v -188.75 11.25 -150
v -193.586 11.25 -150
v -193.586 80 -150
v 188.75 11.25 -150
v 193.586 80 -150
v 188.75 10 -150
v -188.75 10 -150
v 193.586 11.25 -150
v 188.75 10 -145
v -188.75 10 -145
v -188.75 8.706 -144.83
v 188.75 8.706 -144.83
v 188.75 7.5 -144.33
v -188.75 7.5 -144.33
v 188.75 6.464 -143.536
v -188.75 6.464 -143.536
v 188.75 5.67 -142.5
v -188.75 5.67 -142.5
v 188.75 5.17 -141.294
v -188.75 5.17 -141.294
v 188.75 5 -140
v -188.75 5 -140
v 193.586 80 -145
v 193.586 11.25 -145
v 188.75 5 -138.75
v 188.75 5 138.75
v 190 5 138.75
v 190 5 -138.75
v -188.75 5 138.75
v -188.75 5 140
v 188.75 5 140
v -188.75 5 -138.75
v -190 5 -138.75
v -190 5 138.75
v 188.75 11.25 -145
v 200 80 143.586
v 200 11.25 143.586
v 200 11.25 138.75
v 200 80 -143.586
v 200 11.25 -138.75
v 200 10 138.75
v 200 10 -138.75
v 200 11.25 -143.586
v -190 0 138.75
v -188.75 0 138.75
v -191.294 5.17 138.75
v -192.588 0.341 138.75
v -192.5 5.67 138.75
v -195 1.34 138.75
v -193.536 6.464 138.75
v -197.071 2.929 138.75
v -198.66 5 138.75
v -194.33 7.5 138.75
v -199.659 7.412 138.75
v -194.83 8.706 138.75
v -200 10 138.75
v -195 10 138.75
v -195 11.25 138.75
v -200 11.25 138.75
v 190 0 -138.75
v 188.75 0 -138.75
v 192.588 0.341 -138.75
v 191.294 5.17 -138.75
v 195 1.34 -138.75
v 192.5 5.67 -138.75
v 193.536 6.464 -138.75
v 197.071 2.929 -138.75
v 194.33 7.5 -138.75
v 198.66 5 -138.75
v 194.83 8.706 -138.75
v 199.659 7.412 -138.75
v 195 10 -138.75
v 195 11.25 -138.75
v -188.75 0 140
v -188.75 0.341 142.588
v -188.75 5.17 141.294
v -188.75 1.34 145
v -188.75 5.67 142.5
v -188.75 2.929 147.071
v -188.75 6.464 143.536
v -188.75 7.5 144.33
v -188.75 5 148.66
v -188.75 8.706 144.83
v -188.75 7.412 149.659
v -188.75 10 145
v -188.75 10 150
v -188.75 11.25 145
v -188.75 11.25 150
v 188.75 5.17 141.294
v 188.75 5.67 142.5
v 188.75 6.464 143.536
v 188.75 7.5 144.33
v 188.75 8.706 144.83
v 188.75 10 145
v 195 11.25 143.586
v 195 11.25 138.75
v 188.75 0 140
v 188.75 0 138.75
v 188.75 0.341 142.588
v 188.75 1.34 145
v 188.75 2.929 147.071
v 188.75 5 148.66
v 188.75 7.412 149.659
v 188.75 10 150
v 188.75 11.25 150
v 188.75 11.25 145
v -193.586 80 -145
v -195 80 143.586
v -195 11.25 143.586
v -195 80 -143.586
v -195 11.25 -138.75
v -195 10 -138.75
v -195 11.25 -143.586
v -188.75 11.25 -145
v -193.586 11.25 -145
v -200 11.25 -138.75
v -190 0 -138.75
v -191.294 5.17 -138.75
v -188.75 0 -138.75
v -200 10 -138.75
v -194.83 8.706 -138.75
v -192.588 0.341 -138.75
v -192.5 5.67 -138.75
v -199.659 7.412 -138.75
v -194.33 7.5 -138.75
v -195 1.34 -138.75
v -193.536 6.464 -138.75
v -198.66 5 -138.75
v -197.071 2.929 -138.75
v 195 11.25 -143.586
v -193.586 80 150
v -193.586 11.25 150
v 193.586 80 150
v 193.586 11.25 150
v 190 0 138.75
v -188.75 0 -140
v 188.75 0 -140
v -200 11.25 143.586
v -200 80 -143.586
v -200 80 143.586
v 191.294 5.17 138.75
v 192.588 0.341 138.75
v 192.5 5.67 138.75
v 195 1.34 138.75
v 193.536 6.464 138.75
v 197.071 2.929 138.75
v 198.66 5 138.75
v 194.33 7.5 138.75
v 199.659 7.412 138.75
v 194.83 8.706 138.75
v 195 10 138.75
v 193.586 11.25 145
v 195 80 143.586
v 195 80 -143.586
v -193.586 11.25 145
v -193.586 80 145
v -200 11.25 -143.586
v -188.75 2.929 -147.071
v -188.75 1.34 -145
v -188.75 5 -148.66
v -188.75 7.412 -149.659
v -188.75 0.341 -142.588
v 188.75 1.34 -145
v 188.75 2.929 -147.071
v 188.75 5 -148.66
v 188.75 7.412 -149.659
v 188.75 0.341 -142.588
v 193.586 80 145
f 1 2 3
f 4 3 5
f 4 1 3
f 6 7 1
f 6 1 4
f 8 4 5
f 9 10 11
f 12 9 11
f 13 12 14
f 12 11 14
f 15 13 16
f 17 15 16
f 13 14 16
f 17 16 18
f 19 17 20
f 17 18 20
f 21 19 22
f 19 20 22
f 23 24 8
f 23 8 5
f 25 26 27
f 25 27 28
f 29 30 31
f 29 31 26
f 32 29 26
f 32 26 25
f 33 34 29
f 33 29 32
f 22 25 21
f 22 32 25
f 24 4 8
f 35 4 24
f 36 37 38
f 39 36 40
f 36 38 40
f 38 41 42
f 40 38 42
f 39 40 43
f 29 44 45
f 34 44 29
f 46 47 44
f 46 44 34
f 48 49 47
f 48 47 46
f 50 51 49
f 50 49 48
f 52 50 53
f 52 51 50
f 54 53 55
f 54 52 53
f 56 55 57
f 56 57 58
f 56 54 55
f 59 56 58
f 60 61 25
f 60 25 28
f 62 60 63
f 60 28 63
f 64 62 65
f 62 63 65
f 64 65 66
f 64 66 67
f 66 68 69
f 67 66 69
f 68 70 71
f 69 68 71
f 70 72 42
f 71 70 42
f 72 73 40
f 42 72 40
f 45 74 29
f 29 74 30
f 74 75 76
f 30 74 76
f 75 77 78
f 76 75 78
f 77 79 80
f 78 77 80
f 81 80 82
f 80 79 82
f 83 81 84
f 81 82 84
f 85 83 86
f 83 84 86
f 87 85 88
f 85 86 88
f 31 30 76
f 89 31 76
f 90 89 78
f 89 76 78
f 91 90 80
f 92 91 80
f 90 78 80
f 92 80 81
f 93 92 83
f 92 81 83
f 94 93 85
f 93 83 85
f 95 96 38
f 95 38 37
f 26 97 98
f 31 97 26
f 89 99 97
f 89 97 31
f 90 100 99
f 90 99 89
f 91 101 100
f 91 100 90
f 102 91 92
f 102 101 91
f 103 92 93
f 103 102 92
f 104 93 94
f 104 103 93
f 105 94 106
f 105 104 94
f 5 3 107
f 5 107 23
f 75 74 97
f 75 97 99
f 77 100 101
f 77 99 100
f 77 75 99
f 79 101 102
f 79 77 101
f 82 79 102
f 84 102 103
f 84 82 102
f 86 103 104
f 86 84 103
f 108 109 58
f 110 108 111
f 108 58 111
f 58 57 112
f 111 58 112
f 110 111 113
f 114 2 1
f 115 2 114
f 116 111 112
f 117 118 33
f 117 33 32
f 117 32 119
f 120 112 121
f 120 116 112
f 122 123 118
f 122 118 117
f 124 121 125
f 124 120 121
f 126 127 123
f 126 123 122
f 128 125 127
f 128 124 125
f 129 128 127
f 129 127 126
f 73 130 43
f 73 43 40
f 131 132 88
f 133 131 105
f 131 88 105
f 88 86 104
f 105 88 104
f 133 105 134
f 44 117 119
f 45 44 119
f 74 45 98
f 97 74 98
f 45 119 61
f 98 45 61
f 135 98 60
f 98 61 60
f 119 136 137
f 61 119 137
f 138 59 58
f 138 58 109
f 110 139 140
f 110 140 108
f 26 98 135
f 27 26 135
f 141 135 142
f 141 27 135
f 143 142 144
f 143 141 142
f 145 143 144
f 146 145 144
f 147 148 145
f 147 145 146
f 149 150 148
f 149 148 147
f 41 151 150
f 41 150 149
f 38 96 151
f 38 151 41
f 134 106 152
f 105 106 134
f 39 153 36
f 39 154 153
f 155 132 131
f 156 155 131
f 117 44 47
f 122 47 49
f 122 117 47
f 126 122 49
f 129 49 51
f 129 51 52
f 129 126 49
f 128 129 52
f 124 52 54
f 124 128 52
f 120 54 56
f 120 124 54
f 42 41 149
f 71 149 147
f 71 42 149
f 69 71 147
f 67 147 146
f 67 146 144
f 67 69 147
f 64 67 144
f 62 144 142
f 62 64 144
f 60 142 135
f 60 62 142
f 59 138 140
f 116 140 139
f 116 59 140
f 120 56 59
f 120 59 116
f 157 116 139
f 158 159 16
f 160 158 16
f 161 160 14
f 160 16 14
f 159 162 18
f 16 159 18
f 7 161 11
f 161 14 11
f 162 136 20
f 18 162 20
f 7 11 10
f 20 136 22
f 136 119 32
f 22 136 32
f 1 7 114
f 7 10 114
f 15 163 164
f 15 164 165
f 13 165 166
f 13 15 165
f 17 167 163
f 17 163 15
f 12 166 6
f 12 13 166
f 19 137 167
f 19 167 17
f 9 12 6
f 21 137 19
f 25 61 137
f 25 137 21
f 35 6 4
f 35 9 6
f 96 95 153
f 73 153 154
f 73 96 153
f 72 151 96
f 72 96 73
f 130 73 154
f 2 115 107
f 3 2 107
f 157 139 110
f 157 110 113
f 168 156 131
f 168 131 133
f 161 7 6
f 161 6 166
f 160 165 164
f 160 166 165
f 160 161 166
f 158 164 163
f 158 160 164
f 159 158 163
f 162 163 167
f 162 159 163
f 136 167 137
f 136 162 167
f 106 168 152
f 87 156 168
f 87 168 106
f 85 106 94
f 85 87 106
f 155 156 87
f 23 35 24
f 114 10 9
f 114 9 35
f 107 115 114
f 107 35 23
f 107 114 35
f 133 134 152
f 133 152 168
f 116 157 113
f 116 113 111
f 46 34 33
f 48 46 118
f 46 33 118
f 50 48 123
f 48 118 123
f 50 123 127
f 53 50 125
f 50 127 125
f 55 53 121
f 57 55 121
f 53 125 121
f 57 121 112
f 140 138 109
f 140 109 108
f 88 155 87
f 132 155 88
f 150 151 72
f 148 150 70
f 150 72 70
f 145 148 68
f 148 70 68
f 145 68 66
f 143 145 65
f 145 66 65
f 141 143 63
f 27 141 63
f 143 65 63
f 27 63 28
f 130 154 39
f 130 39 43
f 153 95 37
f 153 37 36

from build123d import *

# Parameters (mm, degrees)
SKETCH1_W              = 400
SKETCH1_H              = 300
BOSS_EXTRUDE1_DEPTH    = 80
SHELL1_T               = -5
CONVERT_SOLID1_START   = -200
CONVERT_SOLID1_DEPTH   = 400
CONVERT_SOLID1_2_DEPTH = 6.414213562
CONVERT_SOLID1_START_2 = 193.585786438
CONVERT_SOLID1_3_DEPTH = 6.414213562
CONVERT_SOLID1_START_3 = -193.585786438
CONVERT_SOLID1_4_DEPTH = 4.835786438
CONVERT_SOLID1_START_4 = 188.75
CONVERT_SOLID1_5_DEPTH = 4.835786438
CONVERT_SOLID1_START_5 = -188.75
CONVERT_SOLID1_6_DEPTH = 377.5
CONVERT_SOLID1_START_6 = -138.75
CONVERT_SOLID1_7_DEPTH = 277.5
CONVERT_SOLID1_8_DEPTH = 277.5


with BuildPart() as part:
    # Sketch1 → Boss-Extrude1 (new body)
    with BuildSketch(Plane(origin=(0, 0, 0), x_dir=(1, 0, 0), z_dir=(0, 1, 0))):
        Rectangle(SKETCH1_W, SKETCH1_H)
    extrude(amount=BOSS_EXTRUDE1_DEPTH)

    # Shell1
    shell1_openings = [part.faces().sort_by_distance(p)[0] for p in [
        (0, 80, 0),
    ]]
    offset(amount=SHELL1_T, openings=shell1_openings, kind=Kind.INTERSECTION)

    # Convert-Solid1: read off the stored shape, not the designer's step
    # Convert-Solid1 outline → Convert-Solid1 (cut)
    with BuildSketch(Plane.YZ.offset(CONVERT_SOLID1_START)):
        with BuildLine():
            Line((11.25, -138.75), (5, -138.75))
            Line((5, -138.75), (5, -140))
            ThreePointArc((5, -140), (6.464466094, -143.535533906), (10, -145))
            Line((10, -145), (80, -145))
            Line((80, -145), (80, -143.585786438))
            Line((80, -143.585786438), (11.25, -143.585786438))
            Line((11.25, -143.585786438), (11.25, -138.75))
        make_face()
        with BuildLine():
            Line((5, 140), (5, 138.75))
            Line((5, 138.75), (11.25, 138.75))
            Line((11.25, 138.75), (11.25, 143.585786438))
            Line((11.25, 143.585786438), (80, 143.585786438))
            Line((80, 143.585786438), (80, 145))
            Line((80, 145), (10, 145))
            ThreePointArc((10, 145), (6.464466094, 143.535533906), (5, 140))
        make_face()
        with BuildLine():
            ThreePointArc((10, -150), (2.928932188, -147.071067812), (0, -140))
            Line((0, -140), (0, -150))
            Line((0, -150), (10, -150))
        make_face()
        with BuildLine():
            Line((0, 150), (0, 140))
            ThreePointArc((0, 140), (2.928932188, 147.071067812), (10, 150))
            Line((10, 150), (0, 150))
        make_face()
    extrude(amount=CONVERT_SOLID1_DEPTH, mode=Mode.SUBTRACT)

    # Convert-Solid1 2 outline → Convert-Solid1 2 (cut)
    with BuildSketch(Plane.YZ.offset(CONVERT_SOLID1_START)):
        with BuildLine():
            Line((5, -140), (5, -138.75))
            Line((5, -138.75), (0, -138.75))
            Line((0, -138.75), (0, -140))
            ThreePointArc((0, -140), (2.928932188, -147.071067812), (10, -150))
            Line((10, -150), (80, -150))
            Line((80, -150), (80, -145))
            Line((80, -145), (10, -145))
            ThreePointArc((10, -145), (6.464466094, -143.535533906), (5, -140))
        make_face()
        with BuildLine():
            Line((0, 138.75), (5, 138.75))
            Line((5, 138.75), (5, 140))
            ThreePointArc((5, 140), (6.464466094, 143.535533906), (10, 145))
            Line((10, 145), (80, 145))
            Line((80, 145), (80, 150))
            Line((80, 150), (10, 150))
            ThreePointArc((10, 150), (2.928932188, 147.071067812), (0, 140))
            Line((0, 140), (0, 138.75))
        make_face()
    extrude(amount=CONVERT_SOLID1_2_DEPTH, mode=Mode.SUBTRACT)

    # Convert-Solid1 3 outline → Convert-Solid1 3 (cut)
    with BuildSketch(Plane.YZ.offset(CONVERT_SOLID1_START_2)):
        with BuildLine():
            Line((5, -140), (5, -138.75))
            Line((5, -138.75), (0, -138.75))
            Line((0, -138.75), (0, -140))
            ThreePointArc((0, -140), (2.928932188, -147.071067812), (10, -150))
            Line((10, -150), (80, -150))
            Line((80, -150), (80, -145))
            Line((80, -145), (10, -145))
            ThreePointArc((10, -145), (6.464466094, -143.535533906), (5, -140))
        make_face()
        with BuildLine():
            Line((0, 138.75), (5, 138.75))
            Line((5, 138.75), (5, 140))
            ThreePointArc((5, 140), (6.464466094, 143.535533906), (10, 145))
            Line((10, 145), (80, 145))
            Line((80, 145), (80, 150))
            Line((80, 150), (10, 150))
            ThreePointArc((10, 150), (2.928932188, 147.071067812), (0, 140))
            Line((0, 140), (0, 138.75))
        make_face()
    extrude(amount=CONVERT_SOLID1_3_DEPTH, mode=Mode.SUBTRACT)

    # Convert-Solid1 4 outline → Convert-Solid1 4 (cut)
    with BuildSketch(Plane.YZ.offset(CONVERT_SOLID1_START_3)):
        with BuildLine():
            Line((5, -145), (5, -138.75))
            Line((5, -138.75), (0, -138.75))
            Line((0, -138.75), (0, -140))
            ThreePointArc((0, -140), (2.928932188, -147.071067812), (10, -150))
            Line((10, -150), (11.25, -150))
            Line((11.25, -150), (11.25, -145))
            Line((11.25, -145), (5, -145))
        make_face()
        with BuildLine():
            Line((0, 138.75), (5, 138.75))
            Line((5, 138.75), (5, 145))
            Line((5, 145), (11.25, 145))
            Line((11.25, 145), (11.25, 150))
            Line((11.25, 150), (10, 150))
            ThreePointArc((10, 150), (2.928932188, 147.071067812), (0, 140))
            Line((0, 140), (0, 138.75))
        make_face()
    extrude(amount=CONVERT_SOLID1_4_DEPTH, mode=Mode.SUBTRACT)

    # Convert-Solid1 5 outline → Convert-Solid1 5 (cut)
    with BuildSketch(Plane.YZ.offset(CONVERT_SOLID1_START_4)):
        with BuildLine():
            Line((5, -145), (5, -138.75))
            Line((5, -138.75), (0, -138.75))
            Line((0, -138.75), (0, -140))
            ThreePointArc((0, -140), (2.928932188, -147.071067812), (10, -150))
            Line((10, -150), (11.25, -150))
            Line((11.25, -150), (11.25, -145))
            Line((11.25, -145), (5, -145))
        make_face()
        with BuildLine():
            Line((0, 138.75), (5, 138.75))
            Line((5, 138.75), (5, 145))
            Line((5, 145), (11.25, 145))
            Line((11.25, 145), (11.25, 150))
            Line((11.25, 150), (10, 150))
            ThreePointArc((10, 150), (2.928932188, 147.071067812), (0, 140))
            Line((0, 140), (0, 138.75))
        make_face()
    extrude(amount=CONVERT_SOLID1_5_DEPTH, mode=Mode.SUBTRACT)

    # Convert-Solid1 6 outline → Convert-Solid1 6 (add)
    with BuildSketch(Plane.YZ.offset(CONVERT_SOLID1_START_5)):
        with BuildLine():
            ThreePointArc((10, -145), (6.464466094, -143.535533906), (5, -140))
            Line((5, -140), (5, -145))
            Line((5, -145), (10, -145))
        make_face()
        with BuildLine():
            Line((5, 145), (5, 140))
            ThreePointArc((5, 140), (6.464466094, 143.535533906), (10, 145))
            Line((10, 145), (5, 145))
        make_face()
    extrude(amount=CONVERT_SOLID1_6_DEPTH)

    # Convert-Solid1 7 outline → Convert-Solid1 7 (cut)
    with BuildSketch(Plane.XY.offset(CONVERT_SOLID1_START_6)):
        with BuildLine():
            ThreePointArc((200, 10), (197.071067812, 2.928932188), (190, 0))
            Line((190, 0), (200, 0))
            Line((200, 0), (200, 10))
        make_face()
        with BuildLine():
            ThreePointArc((-190, 0), (-197.071067812, 2.928932188), (-200, 10))
            Line((-200, 10), (-200, 0))
            Line((-200, 0), (-190, 0))
        make_face()
    extrude(amount=CONVERT_SOLID1_7_DEPTH, mode=Mode.SUBTRACT)

    # Convert-Solid1 8 outline → Convert-Solid1 8 (add)
    with BuildSketch(Plane.XY.offset(CONVERT_SOLID1_START_6)):
        with BuildLine():
            ThreePointArc((195, 10), (193.535533906, 6.464466094), (190, 5))
            Line((190, 5), (195, 5))
            Line((195, 5), (195, 10))
        make_face()
        with BuildLine():
            ThreePointArc((-190, 5), (-193.535533906, 6.464466094), (-195, 10))
            Line((-195, 10), (-195, 5))
            Line((-195, 5), (-190, 5))
        make_face()
    extrude(amount=CONVERT_SOLID1_8_DEPTH)


solid = part.part
